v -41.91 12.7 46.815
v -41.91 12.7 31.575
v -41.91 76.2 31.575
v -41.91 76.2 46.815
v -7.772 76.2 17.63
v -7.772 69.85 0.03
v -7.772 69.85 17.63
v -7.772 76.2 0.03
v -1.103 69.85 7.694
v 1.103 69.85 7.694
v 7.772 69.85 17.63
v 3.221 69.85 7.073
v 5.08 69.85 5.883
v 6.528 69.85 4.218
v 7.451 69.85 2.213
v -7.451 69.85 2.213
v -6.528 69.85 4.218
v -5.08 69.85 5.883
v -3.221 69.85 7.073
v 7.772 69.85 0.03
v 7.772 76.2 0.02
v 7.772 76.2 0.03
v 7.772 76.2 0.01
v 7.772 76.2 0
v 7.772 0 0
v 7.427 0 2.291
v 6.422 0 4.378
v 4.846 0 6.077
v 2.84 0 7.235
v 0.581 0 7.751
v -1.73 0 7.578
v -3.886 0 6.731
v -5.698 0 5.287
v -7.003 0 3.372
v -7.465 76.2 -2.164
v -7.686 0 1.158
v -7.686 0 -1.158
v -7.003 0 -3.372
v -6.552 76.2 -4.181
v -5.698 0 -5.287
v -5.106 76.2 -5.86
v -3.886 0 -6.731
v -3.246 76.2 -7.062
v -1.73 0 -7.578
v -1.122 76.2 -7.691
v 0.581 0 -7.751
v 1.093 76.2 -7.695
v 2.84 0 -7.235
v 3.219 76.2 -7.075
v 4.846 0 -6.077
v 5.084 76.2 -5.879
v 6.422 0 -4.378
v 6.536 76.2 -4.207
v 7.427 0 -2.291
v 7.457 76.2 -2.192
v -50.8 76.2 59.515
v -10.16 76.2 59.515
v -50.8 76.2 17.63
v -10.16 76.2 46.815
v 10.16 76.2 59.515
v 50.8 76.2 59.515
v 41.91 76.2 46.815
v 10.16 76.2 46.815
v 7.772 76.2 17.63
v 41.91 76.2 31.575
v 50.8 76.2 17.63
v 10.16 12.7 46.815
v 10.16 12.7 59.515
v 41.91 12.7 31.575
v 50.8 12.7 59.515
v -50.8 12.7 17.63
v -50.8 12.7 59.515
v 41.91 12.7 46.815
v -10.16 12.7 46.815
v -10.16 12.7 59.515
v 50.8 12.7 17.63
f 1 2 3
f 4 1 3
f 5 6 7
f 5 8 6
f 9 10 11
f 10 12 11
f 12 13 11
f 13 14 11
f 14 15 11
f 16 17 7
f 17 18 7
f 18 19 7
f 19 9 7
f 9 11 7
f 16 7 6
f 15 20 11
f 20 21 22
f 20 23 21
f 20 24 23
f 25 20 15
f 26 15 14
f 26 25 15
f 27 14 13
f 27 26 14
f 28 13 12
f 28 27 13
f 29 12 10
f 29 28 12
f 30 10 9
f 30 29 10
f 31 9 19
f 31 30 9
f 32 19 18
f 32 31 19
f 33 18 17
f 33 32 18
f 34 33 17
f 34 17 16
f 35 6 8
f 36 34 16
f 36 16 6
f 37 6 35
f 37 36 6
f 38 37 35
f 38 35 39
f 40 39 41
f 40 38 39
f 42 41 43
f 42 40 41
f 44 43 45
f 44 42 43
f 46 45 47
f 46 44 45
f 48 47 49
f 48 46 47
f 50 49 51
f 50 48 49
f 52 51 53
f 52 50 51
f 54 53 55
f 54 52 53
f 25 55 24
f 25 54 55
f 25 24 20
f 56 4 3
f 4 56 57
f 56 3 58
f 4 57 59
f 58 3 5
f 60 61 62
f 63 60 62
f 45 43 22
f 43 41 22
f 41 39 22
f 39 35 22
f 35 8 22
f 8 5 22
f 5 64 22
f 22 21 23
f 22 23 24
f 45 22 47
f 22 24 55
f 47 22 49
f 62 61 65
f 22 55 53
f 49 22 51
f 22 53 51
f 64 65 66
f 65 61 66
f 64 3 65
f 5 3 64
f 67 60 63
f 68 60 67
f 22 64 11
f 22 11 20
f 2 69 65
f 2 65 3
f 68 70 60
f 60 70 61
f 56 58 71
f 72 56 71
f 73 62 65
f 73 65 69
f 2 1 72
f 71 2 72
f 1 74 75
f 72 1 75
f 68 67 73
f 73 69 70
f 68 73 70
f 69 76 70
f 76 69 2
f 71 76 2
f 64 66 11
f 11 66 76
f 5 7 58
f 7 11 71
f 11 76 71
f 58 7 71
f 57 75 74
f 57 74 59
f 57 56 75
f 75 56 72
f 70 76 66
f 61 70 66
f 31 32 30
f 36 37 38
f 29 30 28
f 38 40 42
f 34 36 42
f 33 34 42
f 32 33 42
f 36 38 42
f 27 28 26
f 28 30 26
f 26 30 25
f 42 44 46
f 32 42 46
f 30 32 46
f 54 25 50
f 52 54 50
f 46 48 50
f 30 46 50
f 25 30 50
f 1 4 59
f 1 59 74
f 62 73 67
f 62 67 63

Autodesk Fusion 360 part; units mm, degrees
sketch "Sketch1" plane through (0, 0, 0) normal (0, 1, 0) x (1, 0, 0)
  circle A0 centre (0, 0) radius 7.7724
  dimension "d1" = 15.5448
extrude "Extrude1" add sketch "Sketch1" along normal blind 76.2
sketch "Sketch2" plane through (0, 76.2, 0) normal (0, 1, 0) x (-1, 0, 0)
  circle A0 centre (0, 0) radius 7.7724
  line L0 (-7.7723, 0.0299) -> (7.7725, 0.0299)
  line L1 (7.7725, 0.0299) -> (7.7725, 17.6304)
  line L2 (7.7725, 17.6304) -> (-7.7723, 17.6304)
  line L3 (-7.7723, 17.6304) -> (-7.7723, 0.0299)
  dimension "d4" = 15.5448
extrude "Extrude2" add sketch "Sketch2" against normal blind 6.35 contours A0 L1 L2 L3
sketch "Sketch3" plane through (0, 0, 17.6304) normal (0, 0, 1) x (-1, 0, 0)
  line L0 (-7.7723, -76.2) -> (7.7725, -76.2)
  line L1 (7.7725, -76.2) -> (7.7725, -69.85)
  line L2 (7.7725, -69.85) -> (-7.7723, -69.85)
  line L3 (-7.7723, -69.85) -> (-7.7723, -76.2)
  line L4 (-50.8, -76.2) -> (50.8, -76.2)
  line L5 (50.8, -76.2) -> (50.8, -12.7)
  line L6 (50.8, -12.7) -> (-50.8, -12.7)
  line L7 (-50.8, -12.7) -> (-50.8, -76.2)
  dimension "d7" = 101.6
  dimension "d8" = 63.5
extrude "Extrude3" add sketch "Sketch3" along normal blind 21.5646
sketch "Sketch4" plane through (0, 0, 39.195) normal (0, 0, 1) x (-1, 0, 0)
  line L0 (-50.8, -12.7) -> (-50.8, -76.2)
  line L1 (-50.8, -76.2) -> (50.8, -76.2)
  line L2 (50.8, -76.2) -> (50.8, -12.7)
  line L3 (50.8, -12.7) -> (-50.8, -12.7)
  line L4 (50.8, -12.7) -> (41.91, -12.7)
  line L5 (41.91, -12.7) -> (41.91, -76.2)
  line L6 (41.91, -76.2) -> (50.8, -76.2)
  line L7 (50.8, -76.2) -> (50.8, -12.7)
  line L8 (-50.8, -76.2) -> (-41.91, -76.2)
  line L9 (-41.91, -76.2) -> (-41.91, -12.7)
  line L10 (-41.91, -12.7) -> (-50.8, -12.7)
  line L11 (-50.8, -12.7) -> (-50.8, -76.2)
  dimension "d11" = 8.89
  dimension "d12" = 63.5
  dimension "d13" = 8.89
extrude "Extrude4" add sketch "Sketch4" along normal blind 20.32 contours L0 L1 L3 L8 L9 L10 L11 | L1 L2 L3 L4 L5 L6 L7
sketch "Sketch5" plane through (-41.91, 0, 0) normal (1, 0, 0) x (0, 1, 0)
  line L0 (12.7, 39.195) -> (76.2, 39.195)
  line L1 (76.2, 39.195) -> (76.2, 59.515)
  line L2 (76.2, 59.515) -> (12.7, 59.515)
  line L3 (12.7, 59.515) -> (12.7, 39.195)
  line L4 (12.7, 59.515) -> (76.2, 59.515)
  line L5 (76.2, 59.515) -> (76.2, 54.435)
  line L6 (76.2, 54.435) -> (12.7, 54.435)
  line L7 (12.7, 54.435) -> (12.7, 59.515)
  dimension "d16" = 63.5
  dimension "d17" = 5.08
sketch "Sketch6" plane through (41.91, 0, 0) normal (-1, 0, 0) x (0, -1, 0)
  line L0 (-76.2, 39.195) -> (-12.7, 39.195)
  line L1 (-12.7, 39.195) -> (-12.7, 59.515)
  line L2 (-12.7, 59.515) -> (-76.2, 59.515)
  line L3 (-76.2, 59.515) -> (-76.2, 39.195)
  line L4 (-76.2, 59.515) -> (-12.7, 59.515)
  line L5 (-12.7, 59.515) -> (-12.7, 54.435)
  line L6 (-12.7, 54.435) -> (-76.2, 54.435)
  line L7 (-76.2, 54.435) -> (-76.2, 59.515)
  dimension "d18" = 63.5
  dimension "d19" = 5.08
extrude "Extrude5" add sketch "Sketch5" along normal blind 31.75 contours L1 L2 L3 L4 L5 L6 L7
sketch "Sketch7" plane through (41.91, 0, 0) normal (-1, 0, 0) x (0, -1, 0)
extrude "Extrude6" add sketch "Sketch6" along normal blind 31.75 contours L1 L2 L3 L4 L5 L6 L7
extrude "Extrude7" cut 1 faces at (2.5908, 33.8667, 39.195) along direction (0, 0, -1) blind 7.62
extrude "Extrude8" add 2 faces at (-31.3267, 55.0333, 54.435) (31.3267, 33.8667, 54.435) along direction (0, 0, -1) blind 7.62
